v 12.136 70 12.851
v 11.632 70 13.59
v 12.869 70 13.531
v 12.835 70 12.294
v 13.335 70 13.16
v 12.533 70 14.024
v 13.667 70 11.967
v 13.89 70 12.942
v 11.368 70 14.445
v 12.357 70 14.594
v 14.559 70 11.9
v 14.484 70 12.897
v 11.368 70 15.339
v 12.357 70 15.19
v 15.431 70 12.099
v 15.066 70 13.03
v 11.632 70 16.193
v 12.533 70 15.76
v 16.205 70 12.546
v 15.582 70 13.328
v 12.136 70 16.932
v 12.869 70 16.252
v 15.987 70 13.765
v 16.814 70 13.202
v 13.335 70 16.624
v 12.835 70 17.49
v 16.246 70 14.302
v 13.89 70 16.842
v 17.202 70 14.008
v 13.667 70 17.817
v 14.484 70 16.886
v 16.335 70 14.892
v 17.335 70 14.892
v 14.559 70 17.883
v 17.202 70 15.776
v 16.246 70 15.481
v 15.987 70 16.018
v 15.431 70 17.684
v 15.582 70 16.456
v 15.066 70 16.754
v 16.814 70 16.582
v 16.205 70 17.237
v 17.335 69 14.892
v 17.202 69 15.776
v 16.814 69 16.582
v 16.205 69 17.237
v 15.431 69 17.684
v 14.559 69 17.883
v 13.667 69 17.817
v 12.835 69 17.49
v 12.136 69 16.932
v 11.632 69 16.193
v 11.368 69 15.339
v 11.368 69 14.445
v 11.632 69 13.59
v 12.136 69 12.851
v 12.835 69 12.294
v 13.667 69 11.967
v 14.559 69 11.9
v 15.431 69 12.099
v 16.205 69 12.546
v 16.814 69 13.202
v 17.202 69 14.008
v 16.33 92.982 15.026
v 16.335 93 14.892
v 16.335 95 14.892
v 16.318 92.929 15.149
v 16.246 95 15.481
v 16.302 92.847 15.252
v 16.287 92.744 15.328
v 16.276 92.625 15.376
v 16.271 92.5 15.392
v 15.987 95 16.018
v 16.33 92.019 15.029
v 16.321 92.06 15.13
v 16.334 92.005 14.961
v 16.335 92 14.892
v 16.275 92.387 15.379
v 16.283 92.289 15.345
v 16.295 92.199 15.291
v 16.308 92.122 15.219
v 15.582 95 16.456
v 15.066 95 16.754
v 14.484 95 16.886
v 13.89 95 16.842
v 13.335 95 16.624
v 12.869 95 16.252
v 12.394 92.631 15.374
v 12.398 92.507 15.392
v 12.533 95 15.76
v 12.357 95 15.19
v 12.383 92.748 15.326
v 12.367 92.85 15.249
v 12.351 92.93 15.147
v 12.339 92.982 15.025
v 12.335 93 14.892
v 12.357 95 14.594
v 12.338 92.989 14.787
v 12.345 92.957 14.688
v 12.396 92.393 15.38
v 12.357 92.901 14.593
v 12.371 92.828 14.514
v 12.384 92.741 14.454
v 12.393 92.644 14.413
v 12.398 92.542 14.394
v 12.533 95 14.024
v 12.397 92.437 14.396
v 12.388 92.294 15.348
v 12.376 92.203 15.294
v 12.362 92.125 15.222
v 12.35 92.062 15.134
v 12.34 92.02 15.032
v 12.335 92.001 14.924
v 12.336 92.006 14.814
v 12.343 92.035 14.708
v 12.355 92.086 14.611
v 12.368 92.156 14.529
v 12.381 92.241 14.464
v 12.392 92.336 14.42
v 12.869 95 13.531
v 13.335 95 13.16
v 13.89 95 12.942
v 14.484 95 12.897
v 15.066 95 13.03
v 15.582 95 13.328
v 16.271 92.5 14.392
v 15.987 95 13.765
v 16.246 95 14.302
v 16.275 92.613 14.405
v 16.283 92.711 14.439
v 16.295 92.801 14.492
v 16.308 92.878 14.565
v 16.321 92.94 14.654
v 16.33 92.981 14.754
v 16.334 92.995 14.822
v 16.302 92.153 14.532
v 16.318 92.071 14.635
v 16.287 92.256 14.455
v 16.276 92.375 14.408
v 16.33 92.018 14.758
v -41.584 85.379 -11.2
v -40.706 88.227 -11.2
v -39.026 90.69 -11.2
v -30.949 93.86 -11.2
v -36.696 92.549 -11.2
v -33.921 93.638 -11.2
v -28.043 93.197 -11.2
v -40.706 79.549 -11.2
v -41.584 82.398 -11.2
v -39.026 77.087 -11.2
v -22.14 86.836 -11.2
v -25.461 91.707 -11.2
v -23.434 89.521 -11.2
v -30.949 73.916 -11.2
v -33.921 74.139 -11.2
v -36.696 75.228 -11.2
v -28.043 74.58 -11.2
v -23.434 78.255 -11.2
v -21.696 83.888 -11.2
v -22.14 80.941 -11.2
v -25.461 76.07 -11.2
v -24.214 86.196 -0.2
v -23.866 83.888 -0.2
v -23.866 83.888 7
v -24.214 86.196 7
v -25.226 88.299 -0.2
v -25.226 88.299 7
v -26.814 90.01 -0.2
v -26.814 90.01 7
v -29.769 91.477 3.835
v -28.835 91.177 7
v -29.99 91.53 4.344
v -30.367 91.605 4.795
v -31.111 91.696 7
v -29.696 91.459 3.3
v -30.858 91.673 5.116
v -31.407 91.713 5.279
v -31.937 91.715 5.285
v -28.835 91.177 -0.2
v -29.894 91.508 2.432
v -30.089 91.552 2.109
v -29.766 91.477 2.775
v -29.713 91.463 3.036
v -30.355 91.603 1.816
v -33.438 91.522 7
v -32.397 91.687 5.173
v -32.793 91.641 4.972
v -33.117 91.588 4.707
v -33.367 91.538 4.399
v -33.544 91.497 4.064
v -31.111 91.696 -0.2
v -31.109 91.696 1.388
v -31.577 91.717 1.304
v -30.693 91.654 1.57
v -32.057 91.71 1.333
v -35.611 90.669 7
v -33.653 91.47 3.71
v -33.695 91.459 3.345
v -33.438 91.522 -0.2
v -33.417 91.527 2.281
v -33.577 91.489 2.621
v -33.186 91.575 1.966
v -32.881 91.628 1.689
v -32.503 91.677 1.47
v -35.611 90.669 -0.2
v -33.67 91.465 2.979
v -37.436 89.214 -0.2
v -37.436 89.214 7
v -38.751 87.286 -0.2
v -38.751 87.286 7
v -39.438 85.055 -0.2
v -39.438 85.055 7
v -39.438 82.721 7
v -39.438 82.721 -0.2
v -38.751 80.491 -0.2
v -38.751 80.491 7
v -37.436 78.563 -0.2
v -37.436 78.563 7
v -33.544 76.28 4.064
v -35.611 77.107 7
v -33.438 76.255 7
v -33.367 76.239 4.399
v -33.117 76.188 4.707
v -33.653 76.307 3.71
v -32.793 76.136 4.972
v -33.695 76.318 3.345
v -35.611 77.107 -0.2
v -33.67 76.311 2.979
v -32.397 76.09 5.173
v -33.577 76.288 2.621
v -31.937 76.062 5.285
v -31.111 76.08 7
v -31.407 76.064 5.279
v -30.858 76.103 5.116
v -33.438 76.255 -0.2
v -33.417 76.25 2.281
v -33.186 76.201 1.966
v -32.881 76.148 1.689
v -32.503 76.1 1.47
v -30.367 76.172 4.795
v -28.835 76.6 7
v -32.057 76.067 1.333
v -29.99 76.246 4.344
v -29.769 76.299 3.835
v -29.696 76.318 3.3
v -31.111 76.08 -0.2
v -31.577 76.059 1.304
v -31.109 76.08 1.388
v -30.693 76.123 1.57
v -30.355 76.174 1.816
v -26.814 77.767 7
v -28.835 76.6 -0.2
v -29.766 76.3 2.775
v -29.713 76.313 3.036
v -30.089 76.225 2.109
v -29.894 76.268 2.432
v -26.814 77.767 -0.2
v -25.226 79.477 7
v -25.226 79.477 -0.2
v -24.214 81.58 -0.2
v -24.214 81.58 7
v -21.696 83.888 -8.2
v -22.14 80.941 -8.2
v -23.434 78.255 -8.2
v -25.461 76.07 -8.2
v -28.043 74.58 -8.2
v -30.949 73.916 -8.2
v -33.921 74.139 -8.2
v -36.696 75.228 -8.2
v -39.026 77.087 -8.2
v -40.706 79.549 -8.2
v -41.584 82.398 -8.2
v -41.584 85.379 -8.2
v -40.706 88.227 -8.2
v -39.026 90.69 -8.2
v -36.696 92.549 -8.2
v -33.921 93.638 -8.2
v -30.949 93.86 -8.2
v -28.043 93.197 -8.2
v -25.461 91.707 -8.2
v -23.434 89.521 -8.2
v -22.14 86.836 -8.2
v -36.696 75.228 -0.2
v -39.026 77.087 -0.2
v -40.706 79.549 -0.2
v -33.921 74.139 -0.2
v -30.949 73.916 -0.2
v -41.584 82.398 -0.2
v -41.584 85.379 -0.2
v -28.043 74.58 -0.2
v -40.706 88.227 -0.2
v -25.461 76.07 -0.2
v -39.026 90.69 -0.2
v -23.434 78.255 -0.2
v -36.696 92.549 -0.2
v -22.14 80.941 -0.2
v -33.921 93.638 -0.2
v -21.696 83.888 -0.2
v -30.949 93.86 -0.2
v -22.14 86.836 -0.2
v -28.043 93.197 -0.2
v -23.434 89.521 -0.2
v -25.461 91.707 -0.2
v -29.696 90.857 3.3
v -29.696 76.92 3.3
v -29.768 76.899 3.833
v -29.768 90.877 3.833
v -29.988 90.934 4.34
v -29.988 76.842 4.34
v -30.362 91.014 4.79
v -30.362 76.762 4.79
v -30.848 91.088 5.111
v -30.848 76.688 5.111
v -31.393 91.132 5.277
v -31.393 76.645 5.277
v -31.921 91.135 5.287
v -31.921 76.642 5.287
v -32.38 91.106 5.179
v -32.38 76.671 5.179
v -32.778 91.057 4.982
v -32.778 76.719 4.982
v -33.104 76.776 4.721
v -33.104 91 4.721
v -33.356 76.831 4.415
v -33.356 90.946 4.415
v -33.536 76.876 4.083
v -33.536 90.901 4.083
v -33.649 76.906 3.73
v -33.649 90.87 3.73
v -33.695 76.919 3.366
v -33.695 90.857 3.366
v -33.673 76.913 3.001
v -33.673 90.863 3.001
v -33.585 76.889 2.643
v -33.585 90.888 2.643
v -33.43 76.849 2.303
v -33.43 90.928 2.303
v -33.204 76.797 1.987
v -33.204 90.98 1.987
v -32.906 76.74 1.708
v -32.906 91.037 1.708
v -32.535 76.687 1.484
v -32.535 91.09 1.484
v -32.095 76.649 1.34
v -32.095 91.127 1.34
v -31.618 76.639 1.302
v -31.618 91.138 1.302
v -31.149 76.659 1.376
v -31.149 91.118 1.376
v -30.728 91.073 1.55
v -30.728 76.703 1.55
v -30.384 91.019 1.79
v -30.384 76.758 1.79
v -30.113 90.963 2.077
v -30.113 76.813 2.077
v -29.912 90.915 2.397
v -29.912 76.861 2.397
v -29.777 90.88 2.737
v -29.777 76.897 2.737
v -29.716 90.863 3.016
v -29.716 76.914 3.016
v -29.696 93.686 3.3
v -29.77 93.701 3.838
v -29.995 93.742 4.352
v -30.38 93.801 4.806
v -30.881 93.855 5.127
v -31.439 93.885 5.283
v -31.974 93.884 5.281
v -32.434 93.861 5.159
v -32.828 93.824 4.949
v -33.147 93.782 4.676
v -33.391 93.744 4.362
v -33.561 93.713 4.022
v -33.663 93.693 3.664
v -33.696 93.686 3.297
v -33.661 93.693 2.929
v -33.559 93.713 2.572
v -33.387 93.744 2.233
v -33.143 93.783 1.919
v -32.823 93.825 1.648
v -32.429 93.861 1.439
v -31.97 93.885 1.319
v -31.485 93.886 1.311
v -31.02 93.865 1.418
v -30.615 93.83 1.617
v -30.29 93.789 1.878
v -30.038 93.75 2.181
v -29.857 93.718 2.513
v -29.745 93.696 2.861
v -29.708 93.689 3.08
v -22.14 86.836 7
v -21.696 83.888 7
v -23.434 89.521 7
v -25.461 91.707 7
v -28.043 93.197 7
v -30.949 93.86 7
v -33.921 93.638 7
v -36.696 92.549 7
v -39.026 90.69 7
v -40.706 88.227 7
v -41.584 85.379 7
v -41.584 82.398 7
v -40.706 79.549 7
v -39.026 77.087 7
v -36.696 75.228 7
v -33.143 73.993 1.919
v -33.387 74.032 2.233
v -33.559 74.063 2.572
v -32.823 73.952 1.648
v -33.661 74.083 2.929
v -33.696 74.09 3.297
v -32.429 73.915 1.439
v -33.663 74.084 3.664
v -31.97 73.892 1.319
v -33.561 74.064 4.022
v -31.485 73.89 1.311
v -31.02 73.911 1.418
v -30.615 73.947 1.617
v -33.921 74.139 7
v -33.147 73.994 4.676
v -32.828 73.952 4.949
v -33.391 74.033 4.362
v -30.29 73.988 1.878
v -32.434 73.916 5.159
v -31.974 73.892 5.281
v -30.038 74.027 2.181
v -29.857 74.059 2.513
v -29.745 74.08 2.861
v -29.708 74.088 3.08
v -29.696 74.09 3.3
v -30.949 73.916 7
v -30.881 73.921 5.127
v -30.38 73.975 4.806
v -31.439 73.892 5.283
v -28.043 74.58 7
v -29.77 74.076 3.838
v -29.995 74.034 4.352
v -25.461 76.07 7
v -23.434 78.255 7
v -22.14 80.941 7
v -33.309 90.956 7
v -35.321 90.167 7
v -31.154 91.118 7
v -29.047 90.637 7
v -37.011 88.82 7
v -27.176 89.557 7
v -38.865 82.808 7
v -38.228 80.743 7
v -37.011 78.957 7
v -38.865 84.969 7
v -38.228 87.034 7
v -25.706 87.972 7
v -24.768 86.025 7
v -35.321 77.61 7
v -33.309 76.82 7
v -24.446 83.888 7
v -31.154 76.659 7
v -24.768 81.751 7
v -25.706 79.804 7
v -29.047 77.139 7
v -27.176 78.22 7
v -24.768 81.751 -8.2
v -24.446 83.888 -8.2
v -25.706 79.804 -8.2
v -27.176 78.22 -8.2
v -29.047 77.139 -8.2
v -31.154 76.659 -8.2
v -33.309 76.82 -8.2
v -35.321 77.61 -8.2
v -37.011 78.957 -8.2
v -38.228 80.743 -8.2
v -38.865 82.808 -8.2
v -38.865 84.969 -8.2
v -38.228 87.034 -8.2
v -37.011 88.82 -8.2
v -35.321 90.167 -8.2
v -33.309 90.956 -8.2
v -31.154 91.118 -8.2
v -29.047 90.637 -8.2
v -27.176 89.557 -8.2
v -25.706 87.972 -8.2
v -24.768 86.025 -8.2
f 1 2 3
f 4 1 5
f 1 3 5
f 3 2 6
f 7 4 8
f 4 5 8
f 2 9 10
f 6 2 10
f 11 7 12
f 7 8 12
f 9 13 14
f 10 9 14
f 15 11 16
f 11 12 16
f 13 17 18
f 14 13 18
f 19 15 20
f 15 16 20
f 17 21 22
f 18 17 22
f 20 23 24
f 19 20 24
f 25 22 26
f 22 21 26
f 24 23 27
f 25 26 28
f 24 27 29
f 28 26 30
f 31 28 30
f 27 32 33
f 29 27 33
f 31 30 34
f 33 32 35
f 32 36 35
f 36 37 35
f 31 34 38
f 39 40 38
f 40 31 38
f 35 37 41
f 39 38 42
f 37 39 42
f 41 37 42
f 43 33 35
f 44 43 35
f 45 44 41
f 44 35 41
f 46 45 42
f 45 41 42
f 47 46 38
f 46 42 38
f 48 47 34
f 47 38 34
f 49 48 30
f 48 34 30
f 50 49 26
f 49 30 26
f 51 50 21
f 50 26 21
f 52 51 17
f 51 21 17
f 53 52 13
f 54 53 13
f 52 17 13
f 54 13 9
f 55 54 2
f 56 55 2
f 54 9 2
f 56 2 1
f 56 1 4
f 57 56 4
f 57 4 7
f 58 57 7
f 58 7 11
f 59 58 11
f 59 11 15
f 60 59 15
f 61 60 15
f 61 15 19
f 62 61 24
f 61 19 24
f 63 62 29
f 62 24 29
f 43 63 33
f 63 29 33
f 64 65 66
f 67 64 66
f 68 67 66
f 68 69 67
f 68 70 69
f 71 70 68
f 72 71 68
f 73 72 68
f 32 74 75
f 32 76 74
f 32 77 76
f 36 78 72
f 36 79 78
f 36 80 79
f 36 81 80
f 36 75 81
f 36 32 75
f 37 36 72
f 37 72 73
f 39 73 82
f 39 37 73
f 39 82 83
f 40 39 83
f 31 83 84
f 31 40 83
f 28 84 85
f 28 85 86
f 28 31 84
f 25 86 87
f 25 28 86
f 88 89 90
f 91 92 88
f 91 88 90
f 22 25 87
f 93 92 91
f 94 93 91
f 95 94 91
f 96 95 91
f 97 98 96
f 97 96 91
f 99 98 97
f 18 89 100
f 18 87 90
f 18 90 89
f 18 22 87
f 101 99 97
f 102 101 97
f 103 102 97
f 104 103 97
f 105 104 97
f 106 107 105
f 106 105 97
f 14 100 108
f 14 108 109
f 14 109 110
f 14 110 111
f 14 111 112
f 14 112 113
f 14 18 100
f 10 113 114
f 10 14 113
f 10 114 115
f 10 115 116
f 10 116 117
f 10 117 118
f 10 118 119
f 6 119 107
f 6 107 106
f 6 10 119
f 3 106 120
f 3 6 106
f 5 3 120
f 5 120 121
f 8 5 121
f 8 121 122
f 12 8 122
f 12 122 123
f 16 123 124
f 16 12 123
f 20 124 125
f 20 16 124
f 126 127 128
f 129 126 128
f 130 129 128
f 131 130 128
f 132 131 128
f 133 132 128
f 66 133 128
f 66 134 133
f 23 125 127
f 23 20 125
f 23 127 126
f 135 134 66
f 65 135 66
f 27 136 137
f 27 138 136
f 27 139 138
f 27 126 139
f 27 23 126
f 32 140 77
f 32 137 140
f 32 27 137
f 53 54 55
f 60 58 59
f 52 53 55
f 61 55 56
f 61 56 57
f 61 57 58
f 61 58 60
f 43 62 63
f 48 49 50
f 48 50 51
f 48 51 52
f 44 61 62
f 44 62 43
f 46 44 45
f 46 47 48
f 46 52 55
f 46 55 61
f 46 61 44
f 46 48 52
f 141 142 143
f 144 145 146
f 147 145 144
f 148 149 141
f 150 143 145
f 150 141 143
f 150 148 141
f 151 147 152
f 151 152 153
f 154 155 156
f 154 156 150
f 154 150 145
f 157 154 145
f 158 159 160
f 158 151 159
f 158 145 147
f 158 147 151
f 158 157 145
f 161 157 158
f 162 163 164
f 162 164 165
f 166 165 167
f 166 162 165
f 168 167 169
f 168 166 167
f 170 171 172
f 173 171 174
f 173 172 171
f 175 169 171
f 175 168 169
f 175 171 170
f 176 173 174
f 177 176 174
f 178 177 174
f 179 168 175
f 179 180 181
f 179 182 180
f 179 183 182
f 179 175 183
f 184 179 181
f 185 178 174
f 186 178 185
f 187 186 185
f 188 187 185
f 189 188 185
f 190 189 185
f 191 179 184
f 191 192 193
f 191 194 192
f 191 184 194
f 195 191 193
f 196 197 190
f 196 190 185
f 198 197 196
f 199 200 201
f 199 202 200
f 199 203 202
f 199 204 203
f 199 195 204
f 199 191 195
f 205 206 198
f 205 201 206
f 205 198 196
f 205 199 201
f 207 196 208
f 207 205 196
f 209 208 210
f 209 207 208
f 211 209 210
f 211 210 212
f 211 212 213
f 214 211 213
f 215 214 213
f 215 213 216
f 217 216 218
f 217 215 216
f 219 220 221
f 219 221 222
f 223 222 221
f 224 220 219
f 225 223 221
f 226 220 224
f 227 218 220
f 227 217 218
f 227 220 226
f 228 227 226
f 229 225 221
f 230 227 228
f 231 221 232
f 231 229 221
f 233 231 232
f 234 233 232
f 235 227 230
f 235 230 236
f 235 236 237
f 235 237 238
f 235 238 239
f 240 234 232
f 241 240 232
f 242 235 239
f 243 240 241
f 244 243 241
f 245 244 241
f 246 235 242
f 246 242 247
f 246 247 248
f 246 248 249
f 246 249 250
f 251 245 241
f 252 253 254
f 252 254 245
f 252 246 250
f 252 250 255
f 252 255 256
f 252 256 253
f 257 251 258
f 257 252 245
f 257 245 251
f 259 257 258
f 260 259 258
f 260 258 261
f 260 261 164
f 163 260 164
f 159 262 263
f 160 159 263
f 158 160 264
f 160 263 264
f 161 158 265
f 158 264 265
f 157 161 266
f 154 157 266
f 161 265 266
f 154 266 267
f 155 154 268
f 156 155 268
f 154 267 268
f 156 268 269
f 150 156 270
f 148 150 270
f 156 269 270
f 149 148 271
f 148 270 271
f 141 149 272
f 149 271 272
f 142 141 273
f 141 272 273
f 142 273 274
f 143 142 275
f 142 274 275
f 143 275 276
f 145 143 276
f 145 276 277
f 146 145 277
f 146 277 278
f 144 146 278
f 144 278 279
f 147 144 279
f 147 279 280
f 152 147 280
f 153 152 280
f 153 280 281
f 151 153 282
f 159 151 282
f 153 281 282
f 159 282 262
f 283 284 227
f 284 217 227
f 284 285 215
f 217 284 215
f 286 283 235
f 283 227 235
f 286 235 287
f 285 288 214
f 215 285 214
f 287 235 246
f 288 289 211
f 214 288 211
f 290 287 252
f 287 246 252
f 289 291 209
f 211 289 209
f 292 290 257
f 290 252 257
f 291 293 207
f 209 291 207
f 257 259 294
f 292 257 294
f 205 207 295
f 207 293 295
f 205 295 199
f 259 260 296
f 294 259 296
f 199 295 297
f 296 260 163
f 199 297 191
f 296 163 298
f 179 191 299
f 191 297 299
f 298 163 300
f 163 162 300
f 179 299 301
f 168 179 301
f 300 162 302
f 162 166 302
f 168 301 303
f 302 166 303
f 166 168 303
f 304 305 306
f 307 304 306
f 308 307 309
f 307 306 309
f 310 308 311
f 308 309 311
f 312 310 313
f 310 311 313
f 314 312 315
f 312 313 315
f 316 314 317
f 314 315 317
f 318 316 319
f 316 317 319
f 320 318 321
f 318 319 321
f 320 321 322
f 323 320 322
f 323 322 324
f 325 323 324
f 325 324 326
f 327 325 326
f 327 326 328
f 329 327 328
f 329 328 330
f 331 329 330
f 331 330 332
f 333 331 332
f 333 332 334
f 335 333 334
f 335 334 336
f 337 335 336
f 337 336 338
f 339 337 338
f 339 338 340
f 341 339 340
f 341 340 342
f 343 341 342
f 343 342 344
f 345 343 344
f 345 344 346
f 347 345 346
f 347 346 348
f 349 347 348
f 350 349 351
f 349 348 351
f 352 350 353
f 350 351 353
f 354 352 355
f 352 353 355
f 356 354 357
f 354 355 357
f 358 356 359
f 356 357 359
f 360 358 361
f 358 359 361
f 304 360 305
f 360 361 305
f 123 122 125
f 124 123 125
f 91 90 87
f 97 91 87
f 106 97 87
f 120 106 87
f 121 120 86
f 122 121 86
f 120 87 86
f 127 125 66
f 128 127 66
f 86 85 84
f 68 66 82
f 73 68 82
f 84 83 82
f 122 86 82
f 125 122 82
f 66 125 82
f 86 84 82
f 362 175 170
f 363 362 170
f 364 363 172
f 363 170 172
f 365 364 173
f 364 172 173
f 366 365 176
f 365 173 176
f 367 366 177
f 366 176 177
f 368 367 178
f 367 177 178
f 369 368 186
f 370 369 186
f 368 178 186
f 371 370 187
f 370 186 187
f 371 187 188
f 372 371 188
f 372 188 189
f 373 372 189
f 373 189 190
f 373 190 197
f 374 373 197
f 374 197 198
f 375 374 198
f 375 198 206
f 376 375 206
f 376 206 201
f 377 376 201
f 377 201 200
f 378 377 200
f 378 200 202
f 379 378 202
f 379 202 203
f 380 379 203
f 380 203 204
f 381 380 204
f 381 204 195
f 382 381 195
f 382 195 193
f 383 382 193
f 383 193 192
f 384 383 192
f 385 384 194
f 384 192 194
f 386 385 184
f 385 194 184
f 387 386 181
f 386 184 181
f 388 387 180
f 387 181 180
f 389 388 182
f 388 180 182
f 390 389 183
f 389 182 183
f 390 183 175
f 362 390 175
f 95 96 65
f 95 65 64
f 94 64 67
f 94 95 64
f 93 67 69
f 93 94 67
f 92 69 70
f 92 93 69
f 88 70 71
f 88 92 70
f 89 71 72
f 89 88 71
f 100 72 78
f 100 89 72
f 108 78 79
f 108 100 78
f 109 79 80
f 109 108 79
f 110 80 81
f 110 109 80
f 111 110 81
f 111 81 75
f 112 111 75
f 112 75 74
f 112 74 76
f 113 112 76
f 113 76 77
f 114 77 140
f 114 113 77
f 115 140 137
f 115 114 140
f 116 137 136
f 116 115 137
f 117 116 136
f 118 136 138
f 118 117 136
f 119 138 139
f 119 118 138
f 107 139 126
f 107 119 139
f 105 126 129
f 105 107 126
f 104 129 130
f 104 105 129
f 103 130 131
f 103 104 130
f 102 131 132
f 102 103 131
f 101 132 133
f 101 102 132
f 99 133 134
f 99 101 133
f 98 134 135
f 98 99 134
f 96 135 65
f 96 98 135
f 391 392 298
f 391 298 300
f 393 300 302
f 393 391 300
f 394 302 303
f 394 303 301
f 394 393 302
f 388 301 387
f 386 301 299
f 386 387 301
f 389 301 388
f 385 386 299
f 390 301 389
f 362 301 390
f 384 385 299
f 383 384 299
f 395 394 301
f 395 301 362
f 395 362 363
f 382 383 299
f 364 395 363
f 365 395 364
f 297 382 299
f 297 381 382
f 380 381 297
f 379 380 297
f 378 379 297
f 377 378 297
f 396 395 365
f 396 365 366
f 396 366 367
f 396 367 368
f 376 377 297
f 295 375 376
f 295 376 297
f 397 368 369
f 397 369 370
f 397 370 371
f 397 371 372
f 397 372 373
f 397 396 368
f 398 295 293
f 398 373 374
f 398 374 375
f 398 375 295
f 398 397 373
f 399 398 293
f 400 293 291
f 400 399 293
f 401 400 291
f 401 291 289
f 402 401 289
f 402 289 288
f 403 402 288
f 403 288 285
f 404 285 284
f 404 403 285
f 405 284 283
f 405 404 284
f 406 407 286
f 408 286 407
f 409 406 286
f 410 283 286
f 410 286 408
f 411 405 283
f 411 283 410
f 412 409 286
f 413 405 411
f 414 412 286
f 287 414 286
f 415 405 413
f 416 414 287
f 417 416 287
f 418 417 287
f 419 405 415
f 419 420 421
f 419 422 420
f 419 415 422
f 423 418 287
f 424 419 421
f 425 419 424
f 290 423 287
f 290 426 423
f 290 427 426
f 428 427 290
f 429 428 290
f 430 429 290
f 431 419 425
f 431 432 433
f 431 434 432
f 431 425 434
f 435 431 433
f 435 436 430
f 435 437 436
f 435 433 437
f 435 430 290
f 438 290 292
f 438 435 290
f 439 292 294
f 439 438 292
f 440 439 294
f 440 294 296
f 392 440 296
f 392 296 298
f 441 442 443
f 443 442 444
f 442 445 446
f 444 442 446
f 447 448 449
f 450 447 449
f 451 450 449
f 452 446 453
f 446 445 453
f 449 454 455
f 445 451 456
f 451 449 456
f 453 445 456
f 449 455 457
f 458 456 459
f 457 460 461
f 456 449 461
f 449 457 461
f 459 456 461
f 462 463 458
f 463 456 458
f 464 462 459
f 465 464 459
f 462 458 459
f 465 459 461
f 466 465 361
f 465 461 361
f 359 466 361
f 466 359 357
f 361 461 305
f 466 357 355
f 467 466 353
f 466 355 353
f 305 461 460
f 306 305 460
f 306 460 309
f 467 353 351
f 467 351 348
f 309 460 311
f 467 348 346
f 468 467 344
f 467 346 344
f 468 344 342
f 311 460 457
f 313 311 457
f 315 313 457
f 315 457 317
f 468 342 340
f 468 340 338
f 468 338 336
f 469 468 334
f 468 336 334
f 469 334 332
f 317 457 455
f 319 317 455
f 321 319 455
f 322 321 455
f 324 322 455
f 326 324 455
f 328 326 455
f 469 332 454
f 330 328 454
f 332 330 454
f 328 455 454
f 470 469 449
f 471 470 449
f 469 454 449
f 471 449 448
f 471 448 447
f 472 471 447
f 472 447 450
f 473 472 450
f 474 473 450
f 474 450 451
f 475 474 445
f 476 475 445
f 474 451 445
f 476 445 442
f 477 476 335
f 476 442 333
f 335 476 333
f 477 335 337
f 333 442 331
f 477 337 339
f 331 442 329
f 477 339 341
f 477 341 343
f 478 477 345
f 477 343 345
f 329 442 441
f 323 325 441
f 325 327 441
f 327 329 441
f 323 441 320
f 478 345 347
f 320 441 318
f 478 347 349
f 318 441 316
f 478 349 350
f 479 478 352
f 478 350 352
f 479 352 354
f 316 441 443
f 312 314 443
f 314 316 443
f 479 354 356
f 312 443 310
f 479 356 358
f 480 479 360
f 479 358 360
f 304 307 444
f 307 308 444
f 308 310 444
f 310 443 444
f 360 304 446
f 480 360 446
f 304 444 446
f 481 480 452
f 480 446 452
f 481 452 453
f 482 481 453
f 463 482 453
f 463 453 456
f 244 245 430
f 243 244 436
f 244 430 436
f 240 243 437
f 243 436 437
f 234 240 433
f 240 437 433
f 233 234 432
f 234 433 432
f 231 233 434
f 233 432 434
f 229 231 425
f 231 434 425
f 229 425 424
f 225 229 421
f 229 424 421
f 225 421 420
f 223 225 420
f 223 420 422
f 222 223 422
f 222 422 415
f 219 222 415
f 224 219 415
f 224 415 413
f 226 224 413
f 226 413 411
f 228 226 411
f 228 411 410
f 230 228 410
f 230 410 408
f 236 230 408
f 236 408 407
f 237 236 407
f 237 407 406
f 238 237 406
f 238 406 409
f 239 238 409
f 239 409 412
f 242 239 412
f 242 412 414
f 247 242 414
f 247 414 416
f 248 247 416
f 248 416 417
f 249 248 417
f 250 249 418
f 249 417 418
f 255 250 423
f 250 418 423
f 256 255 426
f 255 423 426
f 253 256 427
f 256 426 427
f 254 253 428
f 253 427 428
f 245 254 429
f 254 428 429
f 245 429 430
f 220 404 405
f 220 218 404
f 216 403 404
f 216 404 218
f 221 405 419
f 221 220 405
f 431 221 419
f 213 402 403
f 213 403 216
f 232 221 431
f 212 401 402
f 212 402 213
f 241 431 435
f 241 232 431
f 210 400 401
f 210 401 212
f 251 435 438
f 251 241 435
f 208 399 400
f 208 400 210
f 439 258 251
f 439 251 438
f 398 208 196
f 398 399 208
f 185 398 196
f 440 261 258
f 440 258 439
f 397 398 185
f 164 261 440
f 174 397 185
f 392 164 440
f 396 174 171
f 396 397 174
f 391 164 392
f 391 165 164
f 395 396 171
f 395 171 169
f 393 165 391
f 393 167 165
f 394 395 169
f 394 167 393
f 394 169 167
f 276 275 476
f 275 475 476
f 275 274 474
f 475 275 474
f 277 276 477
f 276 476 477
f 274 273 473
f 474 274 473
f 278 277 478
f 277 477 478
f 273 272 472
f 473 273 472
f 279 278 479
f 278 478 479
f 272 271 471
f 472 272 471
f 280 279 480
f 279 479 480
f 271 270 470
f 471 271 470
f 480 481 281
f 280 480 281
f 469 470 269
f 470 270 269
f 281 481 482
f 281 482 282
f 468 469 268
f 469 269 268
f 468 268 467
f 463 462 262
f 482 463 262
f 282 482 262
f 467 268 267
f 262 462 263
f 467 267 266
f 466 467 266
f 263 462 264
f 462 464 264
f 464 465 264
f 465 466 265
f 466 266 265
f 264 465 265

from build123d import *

# Parameters (mm, degrees)
F0_R          = 10
F0_R_2        = 7.83
F1_DEPTH      = 7
F1_DEPTH_BACK = 0.2
F3_R          = 7.25
F4_DEPTH      = 7.2
F4_DEPTH_BACK = 8
F5_START      = 8
F3_R_2        = 10
F3_R_3        = 7.83
F5_DEPTH      = 3
F2_R          = 2
F10_DEPTH     = 93.8892550597
F7_R          = 2
F11_DEPTH     = 25
F7_R_2        = 3
F12_DEPTH     = 1
F13_R         = 0.5
F14_DEPTH     = 25


# Not quite as in the source:
# - a feature of the source that left no trace in its solid (it failed there, or was rolled back) is left out


with BuildPart() as f1:
    # F0 (on Top) → F1 (new body, two sides)
    with BuildSketch(Plane.XY) as f1_sk:
        with Locations((-31.695947051, 83.8882550597)):
            Circle(F0_R)
        with Locations((-31.695947051, 83.8882550597)):
            Circle(F0_R_2, mode=Mode.SUBTRACT)
    extrude(amount=F1_DEPTH)
    extrude(f1_sk.sketch, amount=-F1_DEPTH_BACK)


with BuildPart() as f4:
    # F3 (on face) → F4 (new body, two sides)
    with BuildSketch(Plane(origin=(0, 0, -0.2), x_dir=(1, 0, 0), z_dir=(0, 0, -1))) as f4_sk:
        with Locations((-31.695947051, -83.8882550597)):
            Circle(F3_R)
    extrude(amount=-F4_DEPTH)
    extrude(f4_sk.sketch, amount=F4_DEPTH_BACK)

    # F3 (on face) → F5 (join)
    with BuildSketch(Plane(origin=(0, 0, -0.2), x_dir=(1, 0, 0), z_dir=(0, 0, -1)).offset(F5_START)):
        with Locations((-31.695947051, -83.8882550597)):
            Circle(F3_R_2)
        with Locations((-31.695947051, -83.8882550597)):
            Circle(F3_R_3, mode=Mode.SUBTRACT)
        with Locations((-31.695947051, -83.8882550597)):
            Circle(F3_R_3)
        with Locations((-31.695947051, -83.8882550597)):
            Circle(F3_R, mode=Mode.SUBTRACT)
        with Locations((-31.695947051, -83.8882550597)):
            Circle(F3_R)
    extrude(amount=F5_DEPTH)


with BuildPart() as f10_tool:
    # F2 (on Front) → F10 (new body, through all)
    with BuildSketch(Plane.XZ):
        with Locations((-31.695947051, 3.3)):
            Circle(F2_R)
    extrude(amount=-F10_DEPTH)


with BuildPart() as f1_1:
    add(f1.part)

    # F10: cut by f10_tool
    add(f10_tool.part, mode=Mode.SUBTRACT)


with BuildPart() as f4_1:
    add(f4.part)

    # F10: cut by f10_tool
    add(f10_tool.part, mode=Mode.SUBTRACT)


with BuildPart() as f11:
    # F7 (on offset) → F11 (new body)
    with BuildSketch(Plane.XZ.offset(-70)):
        with Locations((14.3349738792, 14.8918386549)):
            Circle(F7_R)
    extrude(amount=-F11_DEPTH)

    # F7 (on offset) → F12 (join)
    with BuildSketch(Plane.XZ.offset(-70)):
        with Locations((14.3349738792, 14.8918386549)):
            Circle(F7_R_2)
        with Locations((14.3349738792, 14.8918386549)):
            Circle(F7_R, mode=Mode.SUBTRACT)
        with Locations((14.3349738792, 14.8918386549)):
            Circle(F7_R)
    extrude(amount=F12_DEPTH)

    # F13 (on Right) → F14 (cut)
    with BuildSketch(Plane.YZ):
        with Locations((92.5, 14.8918386549)):
            Circle(F13_R)
    extrude(amount=F14_DEPTH, mode=Mode.SUBTRACT)


solid = Compound([f1_1.part, f4_1.part, f11.part])
